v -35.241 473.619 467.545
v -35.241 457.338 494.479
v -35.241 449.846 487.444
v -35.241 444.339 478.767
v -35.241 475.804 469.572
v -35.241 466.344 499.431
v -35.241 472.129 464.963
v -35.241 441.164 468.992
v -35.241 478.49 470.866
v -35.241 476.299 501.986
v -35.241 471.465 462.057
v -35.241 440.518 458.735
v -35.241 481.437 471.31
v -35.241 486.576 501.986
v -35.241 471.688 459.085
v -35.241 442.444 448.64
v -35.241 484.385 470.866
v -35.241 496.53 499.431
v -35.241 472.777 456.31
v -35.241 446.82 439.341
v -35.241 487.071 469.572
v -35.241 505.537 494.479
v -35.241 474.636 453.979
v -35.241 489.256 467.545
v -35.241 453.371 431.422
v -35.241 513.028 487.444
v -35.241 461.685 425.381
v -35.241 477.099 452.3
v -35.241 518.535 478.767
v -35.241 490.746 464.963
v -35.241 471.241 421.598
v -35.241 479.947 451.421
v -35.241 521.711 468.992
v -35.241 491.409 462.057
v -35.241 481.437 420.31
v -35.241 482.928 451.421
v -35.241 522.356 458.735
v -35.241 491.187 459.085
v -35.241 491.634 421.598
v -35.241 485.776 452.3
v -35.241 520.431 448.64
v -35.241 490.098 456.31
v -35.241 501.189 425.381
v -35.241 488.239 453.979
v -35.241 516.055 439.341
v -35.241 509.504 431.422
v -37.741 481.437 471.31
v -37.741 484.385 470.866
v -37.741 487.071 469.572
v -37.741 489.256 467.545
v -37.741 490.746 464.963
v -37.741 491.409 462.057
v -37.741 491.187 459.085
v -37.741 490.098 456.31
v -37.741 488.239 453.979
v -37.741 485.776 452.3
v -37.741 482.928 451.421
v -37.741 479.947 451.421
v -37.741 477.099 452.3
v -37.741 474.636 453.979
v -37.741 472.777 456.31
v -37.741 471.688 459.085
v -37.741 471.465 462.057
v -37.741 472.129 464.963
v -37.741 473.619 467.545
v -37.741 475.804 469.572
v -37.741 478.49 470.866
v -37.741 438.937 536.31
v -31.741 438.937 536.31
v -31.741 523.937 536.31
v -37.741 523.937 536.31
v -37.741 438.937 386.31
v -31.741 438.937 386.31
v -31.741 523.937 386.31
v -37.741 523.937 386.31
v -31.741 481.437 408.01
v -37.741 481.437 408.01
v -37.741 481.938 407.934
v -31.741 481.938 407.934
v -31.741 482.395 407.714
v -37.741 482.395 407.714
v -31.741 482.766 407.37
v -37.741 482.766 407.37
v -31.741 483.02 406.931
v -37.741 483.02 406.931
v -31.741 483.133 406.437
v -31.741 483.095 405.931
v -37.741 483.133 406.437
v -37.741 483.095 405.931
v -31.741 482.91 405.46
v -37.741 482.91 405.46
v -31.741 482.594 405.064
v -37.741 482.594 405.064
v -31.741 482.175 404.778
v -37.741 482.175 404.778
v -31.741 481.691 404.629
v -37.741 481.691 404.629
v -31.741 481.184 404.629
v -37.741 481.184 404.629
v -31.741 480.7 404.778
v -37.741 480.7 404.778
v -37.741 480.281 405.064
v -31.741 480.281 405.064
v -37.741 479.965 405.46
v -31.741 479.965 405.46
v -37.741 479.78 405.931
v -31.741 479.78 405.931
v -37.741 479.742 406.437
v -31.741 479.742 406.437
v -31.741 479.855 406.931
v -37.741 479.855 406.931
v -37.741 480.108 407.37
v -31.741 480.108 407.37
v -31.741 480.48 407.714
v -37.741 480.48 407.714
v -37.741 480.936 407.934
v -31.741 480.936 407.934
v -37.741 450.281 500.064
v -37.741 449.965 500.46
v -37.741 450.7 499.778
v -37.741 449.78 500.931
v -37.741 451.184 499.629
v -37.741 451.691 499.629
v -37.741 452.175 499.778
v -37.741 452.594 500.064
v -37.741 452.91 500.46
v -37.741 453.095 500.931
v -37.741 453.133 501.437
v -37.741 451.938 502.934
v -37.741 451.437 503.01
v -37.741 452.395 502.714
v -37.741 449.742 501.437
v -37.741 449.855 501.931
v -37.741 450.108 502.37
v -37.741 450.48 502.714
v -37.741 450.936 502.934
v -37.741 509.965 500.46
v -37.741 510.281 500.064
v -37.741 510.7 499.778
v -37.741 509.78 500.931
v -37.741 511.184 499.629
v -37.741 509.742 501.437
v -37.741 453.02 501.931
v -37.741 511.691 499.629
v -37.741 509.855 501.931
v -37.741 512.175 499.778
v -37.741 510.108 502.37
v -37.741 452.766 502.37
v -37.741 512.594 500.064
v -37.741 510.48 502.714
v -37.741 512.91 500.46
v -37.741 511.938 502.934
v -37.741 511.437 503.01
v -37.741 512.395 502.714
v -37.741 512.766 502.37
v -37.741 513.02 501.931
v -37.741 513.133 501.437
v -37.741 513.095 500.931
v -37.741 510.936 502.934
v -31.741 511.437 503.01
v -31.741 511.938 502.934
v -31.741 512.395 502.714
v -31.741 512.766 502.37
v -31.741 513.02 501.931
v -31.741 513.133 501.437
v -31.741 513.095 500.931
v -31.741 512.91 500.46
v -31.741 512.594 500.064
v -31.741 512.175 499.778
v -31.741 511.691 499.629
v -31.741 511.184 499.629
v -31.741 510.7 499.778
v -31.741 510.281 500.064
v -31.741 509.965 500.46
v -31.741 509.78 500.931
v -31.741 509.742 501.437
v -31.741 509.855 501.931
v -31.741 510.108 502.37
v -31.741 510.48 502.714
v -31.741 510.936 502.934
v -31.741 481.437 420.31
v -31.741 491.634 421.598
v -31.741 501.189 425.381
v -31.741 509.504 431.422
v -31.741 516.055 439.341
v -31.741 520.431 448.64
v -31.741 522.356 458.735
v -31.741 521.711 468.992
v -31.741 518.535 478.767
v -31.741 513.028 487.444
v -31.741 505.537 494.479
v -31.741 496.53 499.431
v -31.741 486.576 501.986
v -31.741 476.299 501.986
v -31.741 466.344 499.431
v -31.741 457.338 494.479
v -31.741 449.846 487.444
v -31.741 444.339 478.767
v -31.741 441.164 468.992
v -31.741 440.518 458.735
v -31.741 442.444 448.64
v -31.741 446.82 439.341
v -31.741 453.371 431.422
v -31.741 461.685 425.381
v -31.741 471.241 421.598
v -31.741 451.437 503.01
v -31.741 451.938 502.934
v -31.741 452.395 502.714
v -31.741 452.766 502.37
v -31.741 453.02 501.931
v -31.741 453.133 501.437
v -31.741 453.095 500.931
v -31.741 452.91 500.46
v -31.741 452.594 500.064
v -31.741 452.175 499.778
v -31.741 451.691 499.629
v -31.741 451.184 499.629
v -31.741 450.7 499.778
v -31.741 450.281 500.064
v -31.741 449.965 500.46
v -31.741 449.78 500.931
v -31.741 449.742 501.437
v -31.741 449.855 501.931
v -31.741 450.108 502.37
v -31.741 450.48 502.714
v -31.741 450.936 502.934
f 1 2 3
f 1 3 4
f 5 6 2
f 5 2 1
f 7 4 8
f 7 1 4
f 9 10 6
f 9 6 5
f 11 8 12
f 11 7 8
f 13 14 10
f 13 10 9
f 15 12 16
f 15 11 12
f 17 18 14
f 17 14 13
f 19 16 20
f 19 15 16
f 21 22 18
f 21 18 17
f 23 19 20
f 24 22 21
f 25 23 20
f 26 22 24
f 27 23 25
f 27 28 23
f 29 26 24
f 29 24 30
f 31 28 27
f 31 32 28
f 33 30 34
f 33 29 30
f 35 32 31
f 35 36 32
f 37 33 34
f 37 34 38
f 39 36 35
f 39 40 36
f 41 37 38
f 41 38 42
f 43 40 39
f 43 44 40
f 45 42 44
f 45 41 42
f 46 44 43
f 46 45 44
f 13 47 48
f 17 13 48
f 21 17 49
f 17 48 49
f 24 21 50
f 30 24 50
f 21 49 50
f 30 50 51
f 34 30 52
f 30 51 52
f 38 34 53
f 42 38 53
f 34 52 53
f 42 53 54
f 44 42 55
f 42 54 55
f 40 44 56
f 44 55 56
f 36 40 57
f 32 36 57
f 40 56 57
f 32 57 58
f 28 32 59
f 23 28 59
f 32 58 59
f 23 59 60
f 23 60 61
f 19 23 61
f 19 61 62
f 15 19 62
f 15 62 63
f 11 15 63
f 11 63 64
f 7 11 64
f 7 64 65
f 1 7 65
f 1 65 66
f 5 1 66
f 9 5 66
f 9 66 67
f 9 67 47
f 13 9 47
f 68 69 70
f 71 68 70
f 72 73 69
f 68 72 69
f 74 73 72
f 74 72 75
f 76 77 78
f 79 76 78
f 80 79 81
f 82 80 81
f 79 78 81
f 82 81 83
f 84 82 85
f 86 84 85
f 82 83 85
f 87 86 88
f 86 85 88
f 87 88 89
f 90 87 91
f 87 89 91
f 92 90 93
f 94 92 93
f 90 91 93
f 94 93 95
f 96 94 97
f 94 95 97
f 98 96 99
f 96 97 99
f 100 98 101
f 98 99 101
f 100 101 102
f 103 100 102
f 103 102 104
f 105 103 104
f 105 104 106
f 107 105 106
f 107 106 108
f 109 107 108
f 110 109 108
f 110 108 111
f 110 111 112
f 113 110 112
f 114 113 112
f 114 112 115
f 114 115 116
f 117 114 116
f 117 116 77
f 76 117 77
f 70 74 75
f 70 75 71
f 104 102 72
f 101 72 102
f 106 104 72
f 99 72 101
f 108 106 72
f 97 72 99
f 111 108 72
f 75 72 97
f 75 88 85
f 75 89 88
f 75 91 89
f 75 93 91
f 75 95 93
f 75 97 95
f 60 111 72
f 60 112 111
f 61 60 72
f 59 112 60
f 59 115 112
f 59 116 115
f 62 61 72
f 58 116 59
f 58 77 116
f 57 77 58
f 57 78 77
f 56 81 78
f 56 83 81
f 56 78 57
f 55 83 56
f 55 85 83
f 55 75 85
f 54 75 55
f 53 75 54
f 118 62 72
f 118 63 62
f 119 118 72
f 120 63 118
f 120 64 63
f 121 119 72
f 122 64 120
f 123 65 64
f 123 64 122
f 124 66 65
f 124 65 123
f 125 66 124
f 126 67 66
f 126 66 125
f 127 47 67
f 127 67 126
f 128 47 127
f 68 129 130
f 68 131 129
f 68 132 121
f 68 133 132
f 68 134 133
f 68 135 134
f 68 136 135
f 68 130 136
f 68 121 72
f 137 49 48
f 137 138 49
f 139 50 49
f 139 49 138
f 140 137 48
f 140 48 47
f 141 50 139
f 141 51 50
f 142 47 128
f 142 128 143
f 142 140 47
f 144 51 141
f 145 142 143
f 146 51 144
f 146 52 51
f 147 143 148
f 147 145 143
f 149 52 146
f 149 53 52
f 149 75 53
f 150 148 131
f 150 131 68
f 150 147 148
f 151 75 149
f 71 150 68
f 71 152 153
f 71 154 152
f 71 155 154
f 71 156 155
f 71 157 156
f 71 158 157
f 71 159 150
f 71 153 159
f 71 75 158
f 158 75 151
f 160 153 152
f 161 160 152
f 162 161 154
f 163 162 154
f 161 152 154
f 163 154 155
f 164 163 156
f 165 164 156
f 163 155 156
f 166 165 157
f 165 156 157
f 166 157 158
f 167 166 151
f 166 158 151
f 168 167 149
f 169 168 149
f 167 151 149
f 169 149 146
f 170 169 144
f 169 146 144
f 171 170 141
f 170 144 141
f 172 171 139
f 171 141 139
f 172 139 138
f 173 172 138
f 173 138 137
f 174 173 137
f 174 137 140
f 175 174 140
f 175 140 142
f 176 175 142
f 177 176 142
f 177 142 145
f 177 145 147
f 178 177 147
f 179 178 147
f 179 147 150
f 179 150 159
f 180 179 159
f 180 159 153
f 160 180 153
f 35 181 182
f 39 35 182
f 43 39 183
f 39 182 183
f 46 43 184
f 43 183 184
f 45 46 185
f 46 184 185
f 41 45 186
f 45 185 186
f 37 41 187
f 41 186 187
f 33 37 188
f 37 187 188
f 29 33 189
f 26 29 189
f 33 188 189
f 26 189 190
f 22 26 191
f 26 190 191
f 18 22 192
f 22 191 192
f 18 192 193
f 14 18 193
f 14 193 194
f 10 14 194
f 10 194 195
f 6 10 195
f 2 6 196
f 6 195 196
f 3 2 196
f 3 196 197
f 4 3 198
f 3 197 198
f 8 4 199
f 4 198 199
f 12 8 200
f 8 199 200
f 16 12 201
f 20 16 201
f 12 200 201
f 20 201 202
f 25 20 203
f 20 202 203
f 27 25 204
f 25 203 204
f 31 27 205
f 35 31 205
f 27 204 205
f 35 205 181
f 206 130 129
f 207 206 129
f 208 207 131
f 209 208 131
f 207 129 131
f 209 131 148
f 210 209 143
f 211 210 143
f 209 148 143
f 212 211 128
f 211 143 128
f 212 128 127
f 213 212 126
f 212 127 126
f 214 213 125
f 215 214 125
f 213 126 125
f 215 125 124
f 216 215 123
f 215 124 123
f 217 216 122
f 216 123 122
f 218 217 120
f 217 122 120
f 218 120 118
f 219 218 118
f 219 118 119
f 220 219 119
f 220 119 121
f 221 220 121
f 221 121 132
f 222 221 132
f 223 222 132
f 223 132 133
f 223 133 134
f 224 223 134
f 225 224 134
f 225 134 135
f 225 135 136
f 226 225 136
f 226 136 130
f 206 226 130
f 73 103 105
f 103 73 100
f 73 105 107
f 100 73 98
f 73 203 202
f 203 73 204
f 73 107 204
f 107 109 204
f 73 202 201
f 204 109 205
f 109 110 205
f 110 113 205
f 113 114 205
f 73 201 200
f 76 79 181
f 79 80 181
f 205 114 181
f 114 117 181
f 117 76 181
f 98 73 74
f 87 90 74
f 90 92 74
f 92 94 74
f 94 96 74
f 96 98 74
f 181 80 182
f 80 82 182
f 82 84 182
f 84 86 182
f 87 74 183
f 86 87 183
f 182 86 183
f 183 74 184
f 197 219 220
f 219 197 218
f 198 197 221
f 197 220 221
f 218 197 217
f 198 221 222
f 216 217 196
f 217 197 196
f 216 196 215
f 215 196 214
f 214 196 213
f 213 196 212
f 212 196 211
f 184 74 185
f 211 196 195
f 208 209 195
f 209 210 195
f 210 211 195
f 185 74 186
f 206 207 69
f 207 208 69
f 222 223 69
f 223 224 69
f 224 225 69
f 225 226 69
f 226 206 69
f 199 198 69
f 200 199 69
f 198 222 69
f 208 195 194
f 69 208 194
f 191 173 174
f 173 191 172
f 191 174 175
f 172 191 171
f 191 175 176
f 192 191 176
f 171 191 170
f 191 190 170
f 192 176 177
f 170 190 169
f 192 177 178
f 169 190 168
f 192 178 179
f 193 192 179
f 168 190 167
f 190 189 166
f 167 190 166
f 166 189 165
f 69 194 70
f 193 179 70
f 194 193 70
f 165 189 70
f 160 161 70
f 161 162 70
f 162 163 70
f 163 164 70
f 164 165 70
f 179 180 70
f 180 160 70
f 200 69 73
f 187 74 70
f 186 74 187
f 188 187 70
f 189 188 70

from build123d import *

# Parameters (mm, degrees)
BOSS_EXTRUDE1_DEPTH      = 3.5
BOSS_EXTRUDE1_DEPTH_BACK = 2.5
SKETCH1_W                = 150
SKETCH1_H                = 85
SKETCH4_R                = 41
CUT_EXTRUDE2_DEPTH       = 3.5
SKETCH5_R                = 10
CUT_EXTRUDE3_DEPTH       = 750.782985078
SKETCH8_R                = 1.7
CUT_EXTRUDE5_DEPTH       = 750.782985078


with BuildPart() as part:
    # Sketch1 → Boss-Extrude1 (new, two sides: drawn at the far end of the back side and taken through both)
    with BuildSketch(Plane.ZY.offset(34.241420021).offset(-BOSS_EXTRUDE1_DEPTH_BACK)):
        with Locations((461.309777683, 481.437350332)):
            Rectangle(SKETCH1_W, SKETCH1_H)
    extrude(amount=BOSS_EXTRUDE1_DEPTH + BOSS_EXTRUDE1_DEPTH_BACK)

    # Sketch4 → Cut-Extrude2 (cut)
    with BuildSketch(Plane(origin=(-31.741420021, 0, 0), x_dir=(0, 0, -1), z_dir=(1, 0, 0))):
        with Locations((-461.309777683, 481.437350332)):
            Circle(SKETCH4_R)
    extrude(amount=-CUT_EXTRUDE2_DEPTH, mode=Mode.SUBTRACT)

    # Sketch5 → Cut-Extrude3 (cut, through all)
    with BuildSketch(Plane.ZY.offset(37.741420021)):
        with Locations((461.309777683, 481.437350332)):
            Circle(SKETCH5_R)
    extrude(amount=-CUT_EXTRUDE3_DEPTH, mode=Mode.SUBTRACT)

    # Sketch8 → Cut-Extrude5 (cut, through all)
    with BuildSketch(Plane.ZY.offset(37.741420021)):
        with Locations((501.309777683, 511.437350332)):
            Circle(SKETCH8_R)
        with Locations((406.309777683, 481.437350332)):
            Circle(SKETCH8_R)
        with Locations((501.309777683, 451.437350332)):
            Circle(SKETCH8_R)
    extrude(amount=-CUT_EXTRUDE5_DEPTH, mode=Mode.SUBTRACT)


solid = part.part
